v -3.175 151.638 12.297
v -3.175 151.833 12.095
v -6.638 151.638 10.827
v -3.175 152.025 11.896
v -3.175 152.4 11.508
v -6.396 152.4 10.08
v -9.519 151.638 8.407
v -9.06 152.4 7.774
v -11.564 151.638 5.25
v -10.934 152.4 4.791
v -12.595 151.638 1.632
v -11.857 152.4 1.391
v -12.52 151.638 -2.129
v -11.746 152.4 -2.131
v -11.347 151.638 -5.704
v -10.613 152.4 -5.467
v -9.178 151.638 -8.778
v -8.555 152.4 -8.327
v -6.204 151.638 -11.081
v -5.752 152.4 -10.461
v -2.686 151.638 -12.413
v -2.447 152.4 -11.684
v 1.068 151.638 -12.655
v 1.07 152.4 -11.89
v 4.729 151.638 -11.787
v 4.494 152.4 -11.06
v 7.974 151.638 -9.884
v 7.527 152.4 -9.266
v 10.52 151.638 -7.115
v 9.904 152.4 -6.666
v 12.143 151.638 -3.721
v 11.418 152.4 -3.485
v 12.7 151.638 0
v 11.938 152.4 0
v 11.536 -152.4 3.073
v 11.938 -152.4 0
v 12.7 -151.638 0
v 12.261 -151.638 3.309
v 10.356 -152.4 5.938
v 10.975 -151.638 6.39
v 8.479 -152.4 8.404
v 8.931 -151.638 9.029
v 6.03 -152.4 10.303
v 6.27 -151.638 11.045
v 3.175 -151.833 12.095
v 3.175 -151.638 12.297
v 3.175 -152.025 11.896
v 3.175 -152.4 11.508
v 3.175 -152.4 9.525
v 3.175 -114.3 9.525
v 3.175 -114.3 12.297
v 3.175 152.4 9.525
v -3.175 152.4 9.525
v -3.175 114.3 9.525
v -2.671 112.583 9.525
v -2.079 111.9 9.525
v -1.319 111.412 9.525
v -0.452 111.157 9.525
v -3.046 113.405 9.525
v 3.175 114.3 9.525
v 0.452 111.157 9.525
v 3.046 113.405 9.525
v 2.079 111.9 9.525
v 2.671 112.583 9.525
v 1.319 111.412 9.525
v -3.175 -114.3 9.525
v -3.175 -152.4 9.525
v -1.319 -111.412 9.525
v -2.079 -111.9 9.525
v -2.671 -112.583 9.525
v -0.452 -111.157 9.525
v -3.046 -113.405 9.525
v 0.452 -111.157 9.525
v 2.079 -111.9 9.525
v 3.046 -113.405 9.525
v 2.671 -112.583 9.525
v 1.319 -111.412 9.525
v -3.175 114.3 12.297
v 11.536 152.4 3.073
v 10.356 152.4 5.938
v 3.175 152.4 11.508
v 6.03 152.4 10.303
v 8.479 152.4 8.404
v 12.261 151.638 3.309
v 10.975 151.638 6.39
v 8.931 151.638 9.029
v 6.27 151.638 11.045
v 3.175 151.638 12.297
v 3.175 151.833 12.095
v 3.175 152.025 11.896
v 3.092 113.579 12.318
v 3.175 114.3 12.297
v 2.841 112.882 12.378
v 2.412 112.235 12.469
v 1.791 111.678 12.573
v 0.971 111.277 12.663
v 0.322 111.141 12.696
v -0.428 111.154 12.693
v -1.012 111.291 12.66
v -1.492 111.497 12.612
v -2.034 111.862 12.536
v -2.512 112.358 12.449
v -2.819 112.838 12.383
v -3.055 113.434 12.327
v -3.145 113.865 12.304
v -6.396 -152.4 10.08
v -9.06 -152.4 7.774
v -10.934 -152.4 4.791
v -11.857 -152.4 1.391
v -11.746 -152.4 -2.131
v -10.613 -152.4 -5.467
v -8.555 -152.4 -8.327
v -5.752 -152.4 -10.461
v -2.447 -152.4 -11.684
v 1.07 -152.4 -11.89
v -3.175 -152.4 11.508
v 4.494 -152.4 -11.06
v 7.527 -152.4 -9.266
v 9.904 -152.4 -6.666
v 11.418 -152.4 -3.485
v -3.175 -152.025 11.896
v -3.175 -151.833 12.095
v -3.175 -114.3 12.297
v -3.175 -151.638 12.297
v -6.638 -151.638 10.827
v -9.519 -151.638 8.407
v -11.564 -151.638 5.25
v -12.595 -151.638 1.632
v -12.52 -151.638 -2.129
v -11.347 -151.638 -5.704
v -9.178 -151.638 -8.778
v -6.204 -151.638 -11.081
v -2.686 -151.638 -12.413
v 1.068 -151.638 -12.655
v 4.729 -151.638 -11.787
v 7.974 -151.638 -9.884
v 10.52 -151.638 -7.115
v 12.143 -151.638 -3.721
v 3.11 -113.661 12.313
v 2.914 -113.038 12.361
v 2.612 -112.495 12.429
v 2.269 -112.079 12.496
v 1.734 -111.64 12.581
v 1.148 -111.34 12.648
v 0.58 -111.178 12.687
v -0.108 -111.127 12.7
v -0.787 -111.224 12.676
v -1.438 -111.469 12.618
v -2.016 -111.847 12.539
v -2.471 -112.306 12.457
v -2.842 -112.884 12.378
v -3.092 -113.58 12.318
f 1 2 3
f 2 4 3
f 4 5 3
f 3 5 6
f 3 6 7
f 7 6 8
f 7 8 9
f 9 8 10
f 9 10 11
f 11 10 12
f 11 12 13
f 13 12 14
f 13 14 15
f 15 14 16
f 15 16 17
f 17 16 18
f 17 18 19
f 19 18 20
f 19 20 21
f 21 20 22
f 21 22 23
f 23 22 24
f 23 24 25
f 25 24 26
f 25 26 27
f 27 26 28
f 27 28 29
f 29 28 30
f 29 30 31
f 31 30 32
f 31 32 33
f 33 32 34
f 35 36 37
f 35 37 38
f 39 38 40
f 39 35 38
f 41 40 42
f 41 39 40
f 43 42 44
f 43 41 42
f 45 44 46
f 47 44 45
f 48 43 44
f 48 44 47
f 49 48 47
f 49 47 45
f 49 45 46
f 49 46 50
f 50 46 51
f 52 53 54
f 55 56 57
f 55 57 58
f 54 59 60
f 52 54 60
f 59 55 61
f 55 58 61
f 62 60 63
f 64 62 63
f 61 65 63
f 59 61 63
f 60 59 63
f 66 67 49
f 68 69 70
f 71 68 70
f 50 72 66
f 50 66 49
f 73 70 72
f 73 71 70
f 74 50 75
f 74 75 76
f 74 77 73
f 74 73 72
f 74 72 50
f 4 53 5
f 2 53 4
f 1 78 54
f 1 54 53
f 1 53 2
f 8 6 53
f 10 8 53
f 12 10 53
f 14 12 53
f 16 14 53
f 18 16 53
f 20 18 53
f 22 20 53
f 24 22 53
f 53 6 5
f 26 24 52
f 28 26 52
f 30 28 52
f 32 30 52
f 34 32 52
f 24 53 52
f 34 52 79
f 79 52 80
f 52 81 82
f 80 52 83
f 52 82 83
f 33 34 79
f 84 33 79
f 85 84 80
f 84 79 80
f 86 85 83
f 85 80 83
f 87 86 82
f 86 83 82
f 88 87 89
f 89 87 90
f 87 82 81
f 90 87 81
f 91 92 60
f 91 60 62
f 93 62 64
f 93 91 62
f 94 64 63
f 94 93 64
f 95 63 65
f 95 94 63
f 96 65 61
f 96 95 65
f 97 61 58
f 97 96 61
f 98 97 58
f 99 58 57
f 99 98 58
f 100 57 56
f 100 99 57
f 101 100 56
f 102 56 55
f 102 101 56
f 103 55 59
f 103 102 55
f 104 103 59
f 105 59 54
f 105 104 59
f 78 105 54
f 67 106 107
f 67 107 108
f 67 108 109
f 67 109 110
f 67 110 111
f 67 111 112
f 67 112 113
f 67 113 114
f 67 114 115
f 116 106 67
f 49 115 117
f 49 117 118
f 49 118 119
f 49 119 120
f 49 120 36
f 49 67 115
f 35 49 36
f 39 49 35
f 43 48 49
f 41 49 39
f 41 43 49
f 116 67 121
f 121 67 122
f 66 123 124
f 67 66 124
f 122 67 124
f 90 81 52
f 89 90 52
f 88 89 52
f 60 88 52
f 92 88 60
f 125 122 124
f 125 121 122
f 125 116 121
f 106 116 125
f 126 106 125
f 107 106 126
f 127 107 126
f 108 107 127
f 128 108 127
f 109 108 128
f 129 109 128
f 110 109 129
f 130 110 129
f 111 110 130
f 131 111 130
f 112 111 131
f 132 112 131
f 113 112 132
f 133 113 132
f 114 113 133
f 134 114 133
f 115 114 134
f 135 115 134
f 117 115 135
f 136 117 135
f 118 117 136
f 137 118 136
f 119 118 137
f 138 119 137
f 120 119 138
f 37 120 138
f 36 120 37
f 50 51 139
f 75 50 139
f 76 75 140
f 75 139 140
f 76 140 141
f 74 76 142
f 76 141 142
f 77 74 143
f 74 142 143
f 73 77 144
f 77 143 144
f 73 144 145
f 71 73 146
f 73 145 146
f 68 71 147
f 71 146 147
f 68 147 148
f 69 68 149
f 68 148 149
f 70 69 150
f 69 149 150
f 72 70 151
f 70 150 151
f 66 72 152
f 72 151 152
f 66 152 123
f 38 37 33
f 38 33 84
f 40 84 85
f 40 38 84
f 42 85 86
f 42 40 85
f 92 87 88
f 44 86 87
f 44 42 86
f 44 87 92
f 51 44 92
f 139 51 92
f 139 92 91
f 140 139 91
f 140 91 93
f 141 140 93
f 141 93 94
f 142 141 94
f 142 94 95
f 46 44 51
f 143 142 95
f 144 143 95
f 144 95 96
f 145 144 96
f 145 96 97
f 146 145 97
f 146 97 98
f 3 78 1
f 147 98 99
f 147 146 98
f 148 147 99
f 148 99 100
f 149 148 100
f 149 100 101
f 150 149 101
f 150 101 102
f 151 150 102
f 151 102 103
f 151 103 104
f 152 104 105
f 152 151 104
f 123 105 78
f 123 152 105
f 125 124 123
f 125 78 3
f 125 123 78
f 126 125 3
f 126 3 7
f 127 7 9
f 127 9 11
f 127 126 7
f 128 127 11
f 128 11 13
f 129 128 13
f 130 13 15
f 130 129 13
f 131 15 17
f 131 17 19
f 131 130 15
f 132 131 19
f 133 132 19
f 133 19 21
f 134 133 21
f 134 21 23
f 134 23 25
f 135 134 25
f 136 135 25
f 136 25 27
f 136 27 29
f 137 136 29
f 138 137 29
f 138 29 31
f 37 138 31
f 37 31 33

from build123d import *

# Parameters (mm, degrees)
F0_R     = 12.7
F1_DEPTH = 152.4
F4_DEPTH = 3.175
F5_SIZE  = 0.762
F6_SIZE  = 0.762


# Not quite as in the source:
# - a pattern or mirror of a feature is missing from the dataset's text; its kind, count and spacing are read off the source's solid


with BuildPart() as f1:
    # F0 (on Front) → F1 (new body, symmetric)
    with BuildSketch(Plane.XZ):
        Circle(F0_R)
    extrude(amount=F1_DEPTH, both=True)

    # F3 (on offset) → F4 (cut)
    with BuildSketch(Plane.XY.offset(12.7)):
        with BuildLine():
            Line((3.175, -156.7815), (3.175, -114.3))
            ThreePointArc((3.175, -114.3), (0, -111.125), (-3.175, -114.3))
            Line((-3.175, -114.3), (-3.175, -156.7815))
            Line((-3.175, -156.7815), (3.175, -156.7815))
        make_face()
    f4 = extrude(amount=-F4_DEPTH, mode=Mode.SUBTRACT)

    # F4_copies: F4 across plane
    add(f4.mirror(Plane.ZX), mode=Mode.SUBTRACT)

    # F5
    f5_edges = [f1.edges().sort_by_distance(p)[0] for p in [
        (-7.77713, -152.4, -10.040232),
    ]]
    chamfer(f5_edges, length=F5_SIZE)

    # F6
    f6_edges = [f1.edges().sort_by_distance(p)[0] for p in [
        (-7.77713, 152.4, -10.040232),
        (10.040232, 152.4, 7.77713),
    ]]
    chamfer(f6_edges, length=F6_SIZE)


solid = f1.part
